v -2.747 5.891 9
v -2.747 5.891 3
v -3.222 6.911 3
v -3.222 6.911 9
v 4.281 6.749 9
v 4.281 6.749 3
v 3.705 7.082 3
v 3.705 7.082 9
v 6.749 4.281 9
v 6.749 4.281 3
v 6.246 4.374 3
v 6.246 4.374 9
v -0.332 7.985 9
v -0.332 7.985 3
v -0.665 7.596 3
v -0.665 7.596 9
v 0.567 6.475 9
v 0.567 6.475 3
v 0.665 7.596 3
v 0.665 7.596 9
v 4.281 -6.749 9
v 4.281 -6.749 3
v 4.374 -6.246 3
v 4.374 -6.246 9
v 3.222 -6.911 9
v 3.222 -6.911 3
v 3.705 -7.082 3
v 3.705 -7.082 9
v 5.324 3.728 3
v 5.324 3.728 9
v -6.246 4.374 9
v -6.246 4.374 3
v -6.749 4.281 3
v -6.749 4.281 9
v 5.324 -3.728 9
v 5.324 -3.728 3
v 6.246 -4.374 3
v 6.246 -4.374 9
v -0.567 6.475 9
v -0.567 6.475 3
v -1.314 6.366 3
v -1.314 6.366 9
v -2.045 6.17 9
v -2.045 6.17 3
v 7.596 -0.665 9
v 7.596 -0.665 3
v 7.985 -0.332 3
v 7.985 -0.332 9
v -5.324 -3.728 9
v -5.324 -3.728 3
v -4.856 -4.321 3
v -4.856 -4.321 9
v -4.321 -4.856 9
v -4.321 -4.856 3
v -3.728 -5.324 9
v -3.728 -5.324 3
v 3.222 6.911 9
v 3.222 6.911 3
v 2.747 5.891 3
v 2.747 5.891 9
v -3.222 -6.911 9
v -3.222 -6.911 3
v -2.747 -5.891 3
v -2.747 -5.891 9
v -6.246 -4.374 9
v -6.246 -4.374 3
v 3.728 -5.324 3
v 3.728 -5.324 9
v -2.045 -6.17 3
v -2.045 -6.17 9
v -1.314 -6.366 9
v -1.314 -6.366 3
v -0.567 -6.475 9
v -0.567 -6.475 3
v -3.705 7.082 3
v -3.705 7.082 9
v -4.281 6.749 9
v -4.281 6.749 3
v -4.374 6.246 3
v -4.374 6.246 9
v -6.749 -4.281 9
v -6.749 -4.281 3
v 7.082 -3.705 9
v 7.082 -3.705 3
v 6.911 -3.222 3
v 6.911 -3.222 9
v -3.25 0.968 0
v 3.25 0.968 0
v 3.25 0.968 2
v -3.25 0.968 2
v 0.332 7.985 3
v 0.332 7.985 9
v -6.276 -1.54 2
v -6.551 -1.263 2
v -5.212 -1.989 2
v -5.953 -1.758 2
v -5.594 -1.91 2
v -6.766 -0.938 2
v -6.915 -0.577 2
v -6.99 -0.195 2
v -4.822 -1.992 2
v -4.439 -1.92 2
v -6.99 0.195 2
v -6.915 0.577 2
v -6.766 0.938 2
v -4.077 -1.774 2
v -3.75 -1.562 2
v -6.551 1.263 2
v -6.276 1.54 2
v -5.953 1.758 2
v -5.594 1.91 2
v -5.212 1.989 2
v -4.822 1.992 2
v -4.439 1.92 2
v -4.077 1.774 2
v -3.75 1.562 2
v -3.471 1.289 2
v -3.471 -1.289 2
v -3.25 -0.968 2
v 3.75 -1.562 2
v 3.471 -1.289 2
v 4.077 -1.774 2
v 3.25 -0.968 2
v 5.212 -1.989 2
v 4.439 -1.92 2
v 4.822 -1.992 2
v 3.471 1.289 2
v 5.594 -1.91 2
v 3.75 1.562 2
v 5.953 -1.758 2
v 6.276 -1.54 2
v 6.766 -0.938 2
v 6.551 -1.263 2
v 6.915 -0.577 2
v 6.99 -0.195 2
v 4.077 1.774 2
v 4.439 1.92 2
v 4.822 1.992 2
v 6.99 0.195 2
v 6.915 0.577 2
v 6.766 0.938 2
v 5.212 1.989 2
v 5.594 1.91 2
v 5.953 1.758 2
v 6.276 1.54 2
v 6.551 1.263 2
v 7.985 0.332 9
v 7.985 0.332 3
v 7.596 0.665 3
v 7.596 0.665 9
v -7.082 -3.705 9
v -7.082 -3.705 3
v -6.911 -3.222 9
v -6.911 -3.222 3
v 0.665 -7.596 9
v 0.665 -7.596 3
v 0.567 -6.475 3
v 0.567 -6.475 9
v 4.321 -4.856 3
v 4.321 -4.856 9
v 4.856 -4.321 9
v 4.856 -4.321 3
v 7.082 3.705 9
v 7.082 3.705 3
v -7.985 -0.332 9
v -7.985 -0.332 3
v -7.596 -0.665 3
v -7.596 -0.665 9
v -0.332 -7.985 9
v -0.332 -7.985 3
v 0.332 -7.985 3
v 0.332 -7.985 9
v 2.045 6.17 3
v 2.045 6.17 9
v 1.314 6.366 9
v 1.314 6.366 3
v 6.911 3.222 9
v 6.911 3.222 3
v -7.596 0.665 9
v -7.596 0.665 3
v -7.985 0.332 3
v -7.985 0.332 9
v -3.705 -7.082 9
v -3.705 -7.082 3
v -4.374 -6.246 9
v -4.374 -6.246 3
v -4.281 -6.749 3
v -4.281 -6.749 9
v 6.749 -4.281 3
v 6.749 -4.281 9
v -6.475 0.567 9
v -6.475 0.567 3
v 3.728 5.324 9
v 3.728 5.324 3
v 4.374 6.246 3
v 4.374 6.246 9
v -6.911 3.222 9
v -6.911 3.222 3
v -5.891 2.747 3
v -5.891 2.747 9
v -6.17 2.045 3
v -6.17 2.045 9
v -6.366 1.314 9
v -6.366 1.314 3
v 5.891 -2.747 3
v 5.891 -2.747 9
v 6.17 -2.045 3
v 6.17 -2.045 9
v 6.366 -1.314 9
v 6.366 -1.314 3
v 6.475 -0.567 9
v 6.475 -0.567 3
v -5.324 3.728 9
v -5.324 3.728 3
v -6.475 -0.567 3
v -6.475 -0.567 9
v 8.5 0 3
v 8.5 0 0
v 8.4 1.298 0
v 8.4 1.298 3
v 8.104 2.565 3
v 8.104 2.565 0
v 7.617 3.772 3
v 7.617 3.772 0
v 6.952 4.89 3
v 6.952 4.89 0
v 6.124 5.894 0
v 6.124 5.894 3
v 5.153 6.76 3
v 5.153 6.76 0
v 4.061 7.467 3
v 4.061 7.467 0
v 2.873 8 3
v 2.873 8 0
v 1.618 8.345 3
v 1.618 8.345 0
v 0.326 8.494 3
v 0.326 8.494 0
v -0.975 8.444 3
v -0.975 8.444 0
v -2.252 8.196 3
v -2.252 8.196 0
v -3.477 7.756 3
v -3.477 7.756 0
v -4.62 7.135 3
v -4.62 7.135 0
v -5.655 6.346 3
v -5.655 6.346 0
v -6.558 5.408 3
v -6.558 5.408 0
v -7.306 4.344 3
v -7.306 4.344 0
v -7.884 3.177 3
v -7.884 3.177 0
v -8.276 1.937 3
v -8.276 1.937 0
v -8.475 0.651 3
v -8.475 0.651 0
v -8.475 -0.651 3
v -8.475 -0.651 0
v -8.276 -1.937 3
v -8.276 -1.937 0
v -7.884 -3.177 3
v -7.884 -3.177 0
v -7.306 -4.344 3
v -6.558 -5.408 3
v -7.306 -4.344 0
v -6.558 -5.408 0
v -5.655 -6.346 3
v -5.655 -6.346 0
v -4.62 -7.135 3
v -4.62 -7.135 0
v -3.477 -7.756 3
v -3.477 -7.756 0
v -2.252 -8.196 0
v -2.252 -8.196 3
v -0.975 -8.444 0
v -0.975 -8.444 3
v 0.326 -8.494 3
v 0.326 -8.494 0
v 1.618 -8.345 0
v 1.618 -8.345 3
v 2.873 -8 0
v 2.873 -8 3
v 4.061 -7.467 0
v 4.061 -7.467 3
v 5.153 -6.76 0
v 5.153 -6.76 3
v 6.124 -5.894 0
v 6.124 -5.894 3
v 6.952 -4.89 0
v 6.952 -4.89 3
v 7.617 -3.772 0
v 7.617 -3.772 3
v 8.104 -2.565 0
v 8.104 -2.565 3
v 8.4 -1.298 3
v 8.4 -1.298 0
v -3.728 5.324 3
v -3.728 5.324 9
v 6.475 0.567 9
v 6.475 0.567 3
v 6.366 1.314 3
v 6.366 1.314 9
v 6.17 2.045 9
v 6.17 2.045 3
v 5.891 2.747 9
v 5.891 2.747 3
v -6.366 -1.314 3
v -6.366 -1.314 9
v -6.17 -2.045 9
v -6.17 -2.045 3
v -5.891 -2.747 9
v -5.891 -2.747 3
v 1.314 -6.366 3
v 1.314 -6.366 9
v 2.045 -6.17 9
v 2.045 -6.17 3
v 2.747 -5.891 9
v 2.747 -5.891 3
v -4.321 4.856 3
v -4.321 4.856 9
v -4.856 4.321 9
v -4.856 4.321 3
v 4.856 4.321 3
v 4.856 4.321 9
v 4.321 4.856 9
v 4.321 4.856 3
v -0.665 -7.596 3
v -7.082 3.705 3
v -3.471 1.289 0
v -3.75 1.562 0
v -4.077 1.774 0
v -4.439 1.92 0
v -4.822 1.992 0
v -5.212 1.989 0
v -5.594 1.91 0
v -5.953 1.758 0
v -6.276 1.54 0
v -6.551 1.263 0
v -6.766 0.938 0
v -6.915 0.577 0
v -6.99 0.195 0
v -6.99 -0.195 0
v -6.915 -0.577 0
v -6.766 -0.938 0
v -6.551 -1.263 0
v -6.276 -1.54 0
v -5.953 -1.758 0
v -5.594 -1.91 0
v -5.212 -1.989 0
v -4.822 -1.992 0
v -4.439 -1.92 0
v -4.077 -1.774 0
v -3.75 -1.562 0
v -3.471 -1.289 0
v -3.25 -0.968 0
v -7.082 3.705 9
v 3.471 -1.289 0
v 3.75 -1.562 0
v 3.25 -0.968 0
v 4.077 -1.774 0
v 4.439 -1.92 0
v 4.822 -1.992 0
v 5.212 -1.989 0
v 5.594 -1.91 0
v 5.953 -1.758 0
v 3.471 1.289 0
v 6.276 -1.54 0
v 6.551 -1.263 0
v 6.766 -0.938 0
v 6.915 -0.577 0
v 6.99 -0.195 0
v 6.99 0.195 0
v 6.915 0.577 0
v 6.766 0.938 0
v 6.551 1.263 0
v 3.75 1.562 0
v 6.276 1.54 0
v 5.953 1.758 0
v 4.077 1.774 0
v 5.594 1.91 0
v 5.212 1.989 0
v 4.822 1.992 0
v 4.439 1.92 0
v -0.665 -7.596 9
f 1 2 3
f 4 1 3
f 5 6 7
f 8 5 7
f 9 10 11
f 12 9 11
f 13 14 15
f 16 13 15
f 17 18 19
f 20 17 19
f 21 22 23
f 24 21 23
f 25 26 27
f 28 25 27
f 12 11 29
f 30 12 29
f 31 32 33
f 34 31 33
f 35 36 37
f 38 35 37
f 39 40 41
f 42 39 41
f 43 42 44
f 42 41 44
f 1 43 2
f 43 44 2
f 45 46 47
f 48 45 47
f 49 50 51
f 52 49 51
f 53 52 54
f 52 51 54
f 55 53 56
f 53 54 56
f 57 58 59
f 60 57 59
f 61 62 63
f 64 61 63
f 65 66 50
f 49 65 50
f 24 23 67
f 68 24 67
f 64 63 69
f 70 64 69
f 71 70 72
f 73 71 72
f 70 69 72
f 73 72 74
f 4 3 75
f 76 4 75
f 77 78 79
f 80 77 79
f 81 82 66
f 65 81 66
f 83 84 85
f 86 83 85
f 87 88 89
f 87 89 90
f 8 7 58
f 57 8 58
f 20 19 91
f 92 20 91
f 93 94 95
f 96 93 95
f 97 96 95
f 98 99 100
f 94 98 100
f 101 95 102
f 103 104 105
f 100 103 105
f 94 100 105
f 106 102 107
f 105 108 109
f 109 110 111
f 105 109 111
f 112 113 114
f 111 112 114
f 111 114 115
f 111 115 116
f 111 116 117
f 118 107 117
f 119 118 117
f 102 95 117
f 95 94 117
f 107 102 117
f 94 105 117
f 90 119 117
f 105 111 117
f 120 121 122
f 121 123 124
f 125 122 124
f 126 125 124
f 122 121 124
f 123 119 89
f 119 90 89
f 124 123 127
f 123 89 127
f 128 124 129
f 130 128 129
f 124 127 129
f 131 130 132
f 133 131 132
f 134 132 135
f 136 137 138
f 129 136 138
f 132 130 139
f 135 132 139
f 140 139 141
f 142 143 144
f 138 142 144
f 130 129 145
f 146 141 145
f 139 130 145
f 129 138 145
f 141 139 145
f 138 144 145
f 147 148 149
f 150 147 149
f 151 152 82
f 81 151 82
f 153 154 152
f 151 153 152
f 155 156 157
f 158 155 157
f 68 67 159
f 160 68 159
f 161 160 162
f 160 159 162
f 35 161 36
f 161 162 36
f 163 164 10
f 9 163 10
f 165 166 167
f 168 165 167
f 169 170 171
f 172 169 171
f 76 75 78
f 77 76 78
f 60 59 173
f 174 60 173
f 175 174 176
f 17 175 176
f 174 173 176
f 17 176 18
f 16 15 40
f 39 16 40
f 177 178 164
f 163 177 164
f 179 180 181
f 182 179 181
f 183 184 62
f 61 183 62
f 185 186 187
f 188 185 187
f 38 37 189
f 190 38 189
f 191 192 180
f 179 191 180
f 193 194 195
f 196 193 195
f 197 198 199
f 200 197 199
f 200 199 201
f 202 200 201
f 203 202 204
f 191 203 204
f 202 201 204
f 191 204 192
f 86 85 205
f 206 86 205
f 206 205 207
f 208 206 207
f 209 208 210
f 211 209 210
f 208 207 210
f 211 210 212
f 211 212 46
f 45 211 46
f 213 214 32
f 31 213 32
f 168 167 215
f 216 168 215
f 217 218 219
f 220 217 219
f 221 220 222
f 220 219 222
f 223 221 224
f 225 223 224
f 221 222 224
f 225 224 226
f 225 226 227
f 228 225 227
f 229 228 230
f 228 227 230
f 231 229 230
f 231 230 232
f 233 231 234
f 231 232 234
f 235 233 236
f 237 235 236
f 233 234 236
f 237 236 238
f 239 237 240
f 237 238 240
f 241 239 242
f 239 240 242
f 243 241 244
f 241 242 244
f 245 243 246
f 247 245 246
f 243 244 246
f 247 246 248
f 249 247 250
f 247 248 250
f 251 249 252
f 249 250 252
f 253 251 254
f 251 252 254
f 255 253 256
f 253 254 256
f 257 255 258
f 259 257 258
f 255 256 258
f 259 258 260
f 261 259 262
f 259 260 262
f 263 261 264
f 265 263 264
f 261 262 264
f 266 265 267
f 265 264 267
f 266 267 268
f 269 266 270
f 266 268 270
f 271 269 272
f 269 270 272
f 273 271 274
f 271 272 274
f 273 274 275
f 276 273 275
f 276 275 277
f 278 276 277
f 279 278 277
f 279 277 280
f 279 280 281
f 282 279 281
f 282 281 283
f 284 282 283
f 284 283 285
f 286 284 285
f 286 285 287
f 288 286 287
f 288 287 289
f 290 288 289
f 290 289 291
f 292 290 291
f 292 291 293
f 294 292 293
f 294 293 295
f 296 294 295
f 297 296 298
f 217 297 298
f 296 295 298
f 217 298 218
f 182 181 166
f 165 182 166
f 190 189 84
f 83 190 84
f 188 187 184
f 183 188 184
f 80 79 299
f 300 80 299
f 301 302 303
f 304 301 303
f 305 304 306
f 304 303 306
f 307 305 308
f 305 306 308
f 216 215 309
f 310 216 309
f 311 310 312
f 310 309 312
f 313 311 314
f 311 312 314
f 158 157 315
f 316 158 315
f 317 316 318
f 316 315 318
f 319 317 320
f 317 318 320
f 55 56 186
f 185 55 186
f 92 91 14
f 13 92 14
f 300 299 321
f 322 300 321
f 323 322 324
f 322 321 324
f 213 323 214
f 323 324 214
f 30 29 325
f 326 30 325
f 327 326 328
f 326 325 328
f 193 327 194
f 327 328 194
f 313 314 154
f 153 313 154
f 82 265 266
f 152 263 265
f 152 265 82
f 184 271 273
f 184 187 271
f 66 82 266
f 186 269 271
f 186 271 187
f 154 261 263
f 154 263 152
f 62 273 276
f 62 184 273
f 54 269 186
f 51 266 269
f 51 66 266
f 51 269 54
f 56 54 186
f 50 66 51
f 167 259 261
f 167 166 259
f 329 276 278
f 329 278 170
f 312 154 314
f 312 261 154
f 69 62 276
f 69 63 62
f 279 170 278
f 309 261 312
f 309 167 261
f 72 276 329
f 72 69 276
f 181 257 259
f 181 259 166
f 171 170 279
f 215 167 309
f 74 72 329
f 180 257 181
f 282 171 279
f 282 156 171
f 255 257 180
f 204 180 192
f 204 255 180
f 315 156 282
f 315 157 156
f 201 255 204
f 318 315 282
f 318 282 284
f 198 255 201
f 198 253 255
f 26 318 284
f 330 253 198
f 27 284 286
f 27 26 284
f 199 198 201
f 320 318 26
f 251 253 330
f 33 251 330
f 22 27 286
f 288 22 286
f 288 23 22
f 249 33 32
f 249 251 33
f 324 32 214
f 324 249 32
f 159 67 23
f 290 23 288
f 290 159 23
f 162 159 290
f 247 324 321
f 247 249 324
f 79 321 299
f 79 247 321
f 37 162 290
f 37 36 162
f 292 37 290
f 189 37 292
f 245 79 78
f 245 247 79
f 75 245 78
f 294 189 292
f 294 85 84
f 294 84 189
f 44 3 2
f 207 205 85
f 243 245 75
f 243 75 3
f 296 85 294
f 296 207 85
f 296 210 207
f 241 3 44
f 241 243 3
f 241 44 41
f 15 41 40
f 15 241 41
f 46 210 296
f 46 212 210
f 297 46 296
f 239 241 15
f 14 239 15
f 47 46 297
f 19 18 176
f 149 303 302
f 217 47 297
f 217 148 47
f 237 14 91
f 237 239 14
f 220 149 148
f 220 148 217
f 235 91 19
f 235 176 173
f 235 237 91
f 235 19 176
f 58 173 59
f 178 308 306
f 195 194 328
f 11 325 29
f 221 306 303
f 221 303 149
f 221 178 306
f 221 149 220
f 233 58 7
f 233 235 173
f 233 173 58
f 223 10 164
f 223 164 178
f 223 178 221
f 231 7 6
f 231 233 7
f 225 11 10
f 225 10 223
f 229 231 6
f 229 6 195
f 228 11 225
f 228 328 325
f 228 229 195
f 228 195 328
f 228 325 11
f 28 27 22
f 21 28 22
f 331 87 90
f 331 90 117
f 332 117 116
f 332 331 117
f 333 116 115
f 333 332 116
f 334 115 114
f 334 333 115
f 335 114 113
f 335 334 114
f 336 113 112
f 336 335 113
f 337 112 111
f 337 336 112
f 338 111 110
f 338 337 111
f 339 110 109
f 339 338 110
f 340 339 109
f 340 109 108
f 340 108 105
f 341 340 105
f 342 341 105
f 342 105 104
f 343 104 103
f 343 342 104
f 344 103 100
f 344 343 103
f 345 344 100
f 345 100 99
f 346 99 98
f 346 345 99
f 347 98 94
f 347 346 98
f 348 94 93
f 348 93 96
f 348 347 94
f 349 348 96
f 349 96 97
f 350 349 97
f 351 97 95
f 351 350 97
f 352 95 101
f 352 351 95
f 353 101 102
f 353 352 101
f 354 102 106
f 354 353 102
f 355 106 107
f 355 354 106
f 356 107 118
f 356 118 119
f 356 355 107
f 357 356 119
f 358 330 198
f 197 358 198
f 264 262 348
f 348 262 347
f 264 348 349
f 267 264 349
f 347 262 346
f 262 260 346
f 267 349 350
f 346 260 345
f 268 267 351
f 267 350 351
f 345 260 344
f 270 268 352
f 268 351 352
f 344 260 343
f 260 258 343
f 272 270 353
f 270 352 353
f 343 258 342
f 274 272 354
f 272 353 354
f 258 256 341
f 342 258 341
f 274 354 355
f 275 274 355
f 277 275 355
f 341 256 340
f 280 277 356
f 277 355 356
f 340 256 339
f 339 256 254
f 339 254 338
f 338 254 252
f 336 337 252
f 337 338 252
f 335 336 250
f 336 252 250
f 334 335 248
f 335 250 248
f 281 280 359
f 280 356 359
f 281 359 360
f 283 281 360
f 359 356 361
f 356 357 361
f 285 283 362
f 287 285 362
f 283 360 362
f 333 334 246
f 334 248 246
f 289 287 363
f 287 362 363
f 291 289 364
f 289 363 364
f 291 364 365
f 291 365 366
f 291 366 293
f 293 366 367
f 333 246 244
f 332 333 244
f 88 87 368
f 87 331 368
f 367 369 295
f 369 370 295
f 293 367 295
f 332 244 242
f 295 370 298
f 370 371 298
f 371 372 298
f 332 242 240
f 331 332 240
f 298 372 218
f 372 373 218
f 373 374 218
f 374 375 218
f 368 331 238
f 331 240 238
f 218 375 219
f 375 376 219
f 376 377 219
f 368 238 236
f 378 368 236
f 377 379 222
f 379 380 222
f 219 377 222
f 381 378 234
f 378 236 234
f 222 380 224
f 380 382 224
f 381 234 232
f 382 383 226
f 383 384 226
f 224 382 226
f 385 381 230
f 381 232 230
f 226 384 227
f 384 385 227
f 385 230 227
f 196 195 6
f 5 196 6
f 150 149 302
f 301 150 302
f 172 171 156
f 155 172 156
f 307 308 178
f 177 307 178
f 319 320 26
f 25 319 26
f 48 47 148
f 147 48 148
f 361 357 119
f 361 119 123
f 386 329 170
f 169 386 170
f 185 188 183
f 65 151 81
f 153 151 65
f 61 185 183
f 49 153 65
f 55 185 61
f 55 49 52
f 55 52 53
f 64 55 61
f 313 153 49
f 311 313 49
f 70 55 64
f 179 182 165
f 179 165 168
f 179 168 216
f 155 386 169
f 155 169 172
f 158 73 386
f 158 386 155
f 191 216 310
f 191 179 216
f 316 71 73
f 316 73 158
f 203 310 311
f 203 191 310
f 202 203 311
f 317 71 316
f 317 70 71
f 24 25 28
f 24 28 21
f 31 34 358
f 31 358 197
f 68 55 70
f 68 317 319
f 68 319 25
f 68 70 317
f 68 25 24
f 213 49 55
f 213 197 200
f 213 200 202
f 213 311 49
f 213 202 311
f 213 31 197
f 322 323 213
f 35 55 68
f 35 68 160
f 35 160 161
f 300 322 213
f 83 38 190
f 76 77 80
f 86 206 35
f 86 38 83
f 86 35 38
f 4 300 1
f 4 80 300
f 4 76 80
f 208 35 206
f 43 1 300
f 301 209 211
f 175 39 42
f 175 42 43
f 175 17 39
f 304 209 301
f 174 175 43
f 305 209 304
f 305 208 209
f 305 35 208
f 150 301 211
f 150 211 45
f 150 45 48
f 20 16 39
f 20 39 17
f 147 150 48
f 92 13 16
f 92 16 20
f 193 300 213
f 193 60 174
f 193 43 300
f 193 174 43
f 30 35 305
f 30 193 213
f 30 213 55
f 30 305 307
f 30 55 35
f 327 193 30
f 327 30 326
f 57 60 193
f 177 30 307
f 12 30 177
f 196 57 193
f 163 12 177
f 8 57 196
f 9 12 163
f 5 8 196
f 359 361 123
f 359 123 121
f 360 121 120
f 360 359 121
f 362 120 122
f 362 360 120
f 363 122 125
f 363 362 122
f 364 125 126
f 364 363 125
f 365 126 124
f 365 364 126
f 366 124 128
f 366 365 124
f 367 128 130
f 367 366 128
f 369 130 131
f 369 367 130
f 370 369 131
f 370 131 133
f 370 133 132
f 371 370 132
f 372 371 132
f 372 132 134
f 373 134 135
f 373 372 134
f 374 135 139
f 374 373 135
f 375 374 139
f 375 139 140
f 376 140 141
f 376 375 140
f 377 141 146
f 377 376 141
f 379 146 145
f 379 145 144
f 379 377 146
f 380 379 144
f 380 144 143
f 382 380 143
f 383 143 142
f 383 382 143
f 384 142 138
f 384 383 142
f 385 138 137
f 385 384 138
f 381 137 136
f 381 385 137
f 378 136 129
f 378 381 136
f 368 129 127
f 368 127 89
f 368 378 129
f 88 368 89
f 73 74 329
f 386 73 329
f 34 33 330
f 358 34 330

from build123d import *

# Parameters (mm, degrees)
SKETCH1_R           = 8.5
BOSS_EXTRUDE1_DEPTH = 3
CUT_EXTRUDE2_DEPTH  = 2
BOSS_EXTRUDE4_DEPTH = 6


with BuildPart() as part:
    # Sketch1 → Boss-Extrude1 (new body)
    with BuildSketch(Plane.XY):
        Circle(SKETCH1_R)
    extrude(amount=BOSS_EXTRUDE1_DEPTH)

    # Sketch4 → Cut-Extrude2 (cut)
    with BuildSketch(Plane(origin=(0, 0, 0), x_dir=(-1, 0, 0), z_dir=(0, 0, -1))):
        with BuildLine():
            Line((-3.25, 0.968245837), (3.25, 0.968245837))
            ThreePointArc((3.25, 0.968245837), (7, 0), (3.25, -0.968245837))
            Line((3.25, -0.968245837), (-3.25, -0.968245837))
            ThreePointArc((-3.25, -0.968245837), (-7, 0), (-3.25, 0.968245837))
        make_face()
    extrude(amount=-CUT_EXTRUDE2_DEPTH, mode=Mode.SUBTRACT)

    # Sketch2 → Boss-Extrude4 (add)
    with BuildSketch(Plane.XY.offset(3)):
        with BuildLine():
            Line((3.222464246, 6.910596876), (2.747018701, 5.891000616))
            ThreePointArc((2.747018701, 5.891000616), (1.682323793, 6.278517871), (0.566512328, 6.475265538))
            Line((0.566512328, 6.475265538), (0.664562538, 7.595984573))
            Line((0.664562538, 7.595984573), (0.332281269, 7.985492286))
            Line((0.332281269, 7.985492286), (-0.332281269, 7.985492286))
            Line((-0.332281269, 7.985492286), (-0.664562538, 7.595984573))
            Line((-0.664562538, 7.595984573), (-0.566512328, 6.475265538))
            ThreePointArc((-0.566512328, 6.475265538), (-1.682323793, 6.278517871), (-2.747018701, 5.891000616))
            Line((-2.747018701, 5.891000616), (-3.222464246, 6.910596876))
            Line((-3.222464246, 6.910596876), (-3.704982123, 7.081779816))
            Line((-3.704982123, 7.081779816), (-4.280510164, 6.749498547))
            Line((-4.280510164, 6.749498547), (-4.373520327, 6.246034338))
            Line((-4.373520327, 6.246034338), (-3.728246836, 5.324488288))
            ThreePointArc((-3.728246836, 5.324488288), (-4.596194078, 4.596194078), (-5.324488288, 3.728246836))
            Line((-5.324488288, 3.728246836), (-6.246034338, 4.373520327))
            Line((-6.246034338, 4.373520327), (-6.749498547, 4.280510164))
            Line((-6.749498547, 4.280510164), (-7.081779816, 3.704982123))
            Line((-7.081779816, 3.704982123), (-6.910596876, 3.222464246))
            Line((-6.910596876, 3.222464246), (-5.891000616, 2.747018701))
            ThreePointArc((-5.891000616, 2.747018701), (-6.278517871, 1.682323793), (-6.475265538, 0.566512328))
            Line((-6.475265538, 0.566512328), (-7.595984573, 0.664562538))
            Line((-7.595984573, 0.664562538), (-7.985492286, 0.332281269))
            Line((-7.985492286, 0.332281269), (-7.985492286, -0.332281269))
            Line((-7.985492286, -0.332281269), (-7.595984573, -0.664562538))
            Line((-7.595984573, -0.664562538), (-6.475265538, -0.566512328))
            ThreePointArc((-6.475265538, -0.566512328), (-6.278517871, -1.682323793), (-5.891000616, -2.747018701))
            Line((-5.891000616, -2.747018701), (-6.910596876, -3.222464246))
            Line((-6.910596876, -3.222464246), (-7.081779816, -3.704982123))
            Line((-7.081779816, -3.704982123), (-6.749498547, -4.280510164))
            Line((-6.749498547, -4.280510164), (-6.246034338, -4.373520327))
            Line((-6.246034338, -4.373520327), (-5.324488288, -3.728246836))
            ThreePointArc((-5.324488288, -3.728246836), (-4.596194078, -4.596194078), (-3.728246836, -5.324488288))
            Line((-3.728246836, -5.324488288), (-4.373520327, -6.246034338))
            Line((-4.373520327, -6.246034338), (-4.280510164, -6.749498547))
            Line((-4.280510164, -6.749498547), (-3.704982123, -7.081779816))
            Line((-3.704982123, -7.081779816), (-3.222464246, -6.910596876))
            Line((-3.222464246, -6.910596876), (-2.747018701, -5.891000616))
            ThreePointArc((-2.747018701, -5.891000616), (-1.682323793, -6.278517871), (-0.566512328, -6.475265538))
            Line((-0.566512328, -6.475265538), (-0.664562538, -7.595984573))
            Line((-0.664562538, -7.595984573), (-0.332281269, -7.985492286))
            Line((-0.332281269, -7.985492286), (0.332281269, -7.985492286))
            Line((0.332281269, -7.985492286), (0.664562538, -7.595984573))
            Line((0.664562538, -7.595984573), (0.566512328, -6.475265538))
            ThreePointArc((0.566512328, -6.475265538), (1.682323793, -6.278517871), (2.747018701, -5.891000616))
            Line((2.747018701, -5.891000616), (3.222464246, -6.910596876))
            Line((3.222464246, -6.910596876), (3.704982123, -7.081779816))
            Line((3.704982123, -7.081779816), (4.280510164, -6.749498547))
            Line((4.280510164, -6.749498547), (4.373520327, -6.246034338))
            Line((4.373520327, -6.246034338), (3.728246836, -5.324488288))
            ThreePointArc((3.728246836, -5.324488288), (4.596194078, -4.596194078), (5.324488288, -3.728246836))
            Line((5.324488288, -3.728246836), (6.246034338, -4.373520327))
            Line((6.246034338, -4.373520327), (6.749498547, -4.280510164))
            Line((6.749498547, -4.280510164), (7.081779816, -3.704982123))
            Line((7.081779816, -3.704982123), (6.910596876, -3.222464246))
            Line((6.910596876, -3.222464246), (5.891000616, -2.747018701))
            ThreePointArc((5.891000616, -2.747018701), (6.278517871, -1.682323793), (6.475265538, -0.566512328))
            Line((6.475265538, -0.566512328), (7.595984573, -0.664562538))
            Line((7.595984573, -0.664562538), (7.985492286, -0.332281269))
            Line((7.985492286, -0.332281269), (7.985492286, 0.332281269))
            Line((7.985492286, 0.332281269), (7.595984573, 0.664562538))
            Line((7.595984573, 0.664562538), (6.475265538, 0.566512328))
            ThreePointArc((6.475265538, 0.566512328), (6.278517871, 1.682323793), (5.891000616, 2.747018701))
            Line((5.891000616, 2.747018701), (6.910596876, 3.222464246))
            Line((6.910596876, 3.222464246), (7.081779816, 3.704982123))
            Line((7.081779816, 3.704982123), (6.749498547, 4.280510164))
            Line((6.749498547, 4.280510164), (6.246034338, 4.373520327))
            Line((6.246034338, 4.373520327), (5.324488288, 3.728246836))
            ThreePointArc((5.324488288, 3.728246836), (4.596194078, 4.596194078), (3.728246836, 5.324488288))
            Line((3.728246836, 5.324488288), (4.373520327, 6.246034338))
            Line((4.373520327, 6.246034338), (4.280510164, 6.749498547))
            Line((4.280510164, 6.749498547), (3.704982123, 7.081779816))
            Line((3.704982123, 7.081779816), (3.222464246, 6.910596876))
        make_face()
    extrude(amount=BOSS_EXTRUDE4_DEPTH)


solid = part.part
